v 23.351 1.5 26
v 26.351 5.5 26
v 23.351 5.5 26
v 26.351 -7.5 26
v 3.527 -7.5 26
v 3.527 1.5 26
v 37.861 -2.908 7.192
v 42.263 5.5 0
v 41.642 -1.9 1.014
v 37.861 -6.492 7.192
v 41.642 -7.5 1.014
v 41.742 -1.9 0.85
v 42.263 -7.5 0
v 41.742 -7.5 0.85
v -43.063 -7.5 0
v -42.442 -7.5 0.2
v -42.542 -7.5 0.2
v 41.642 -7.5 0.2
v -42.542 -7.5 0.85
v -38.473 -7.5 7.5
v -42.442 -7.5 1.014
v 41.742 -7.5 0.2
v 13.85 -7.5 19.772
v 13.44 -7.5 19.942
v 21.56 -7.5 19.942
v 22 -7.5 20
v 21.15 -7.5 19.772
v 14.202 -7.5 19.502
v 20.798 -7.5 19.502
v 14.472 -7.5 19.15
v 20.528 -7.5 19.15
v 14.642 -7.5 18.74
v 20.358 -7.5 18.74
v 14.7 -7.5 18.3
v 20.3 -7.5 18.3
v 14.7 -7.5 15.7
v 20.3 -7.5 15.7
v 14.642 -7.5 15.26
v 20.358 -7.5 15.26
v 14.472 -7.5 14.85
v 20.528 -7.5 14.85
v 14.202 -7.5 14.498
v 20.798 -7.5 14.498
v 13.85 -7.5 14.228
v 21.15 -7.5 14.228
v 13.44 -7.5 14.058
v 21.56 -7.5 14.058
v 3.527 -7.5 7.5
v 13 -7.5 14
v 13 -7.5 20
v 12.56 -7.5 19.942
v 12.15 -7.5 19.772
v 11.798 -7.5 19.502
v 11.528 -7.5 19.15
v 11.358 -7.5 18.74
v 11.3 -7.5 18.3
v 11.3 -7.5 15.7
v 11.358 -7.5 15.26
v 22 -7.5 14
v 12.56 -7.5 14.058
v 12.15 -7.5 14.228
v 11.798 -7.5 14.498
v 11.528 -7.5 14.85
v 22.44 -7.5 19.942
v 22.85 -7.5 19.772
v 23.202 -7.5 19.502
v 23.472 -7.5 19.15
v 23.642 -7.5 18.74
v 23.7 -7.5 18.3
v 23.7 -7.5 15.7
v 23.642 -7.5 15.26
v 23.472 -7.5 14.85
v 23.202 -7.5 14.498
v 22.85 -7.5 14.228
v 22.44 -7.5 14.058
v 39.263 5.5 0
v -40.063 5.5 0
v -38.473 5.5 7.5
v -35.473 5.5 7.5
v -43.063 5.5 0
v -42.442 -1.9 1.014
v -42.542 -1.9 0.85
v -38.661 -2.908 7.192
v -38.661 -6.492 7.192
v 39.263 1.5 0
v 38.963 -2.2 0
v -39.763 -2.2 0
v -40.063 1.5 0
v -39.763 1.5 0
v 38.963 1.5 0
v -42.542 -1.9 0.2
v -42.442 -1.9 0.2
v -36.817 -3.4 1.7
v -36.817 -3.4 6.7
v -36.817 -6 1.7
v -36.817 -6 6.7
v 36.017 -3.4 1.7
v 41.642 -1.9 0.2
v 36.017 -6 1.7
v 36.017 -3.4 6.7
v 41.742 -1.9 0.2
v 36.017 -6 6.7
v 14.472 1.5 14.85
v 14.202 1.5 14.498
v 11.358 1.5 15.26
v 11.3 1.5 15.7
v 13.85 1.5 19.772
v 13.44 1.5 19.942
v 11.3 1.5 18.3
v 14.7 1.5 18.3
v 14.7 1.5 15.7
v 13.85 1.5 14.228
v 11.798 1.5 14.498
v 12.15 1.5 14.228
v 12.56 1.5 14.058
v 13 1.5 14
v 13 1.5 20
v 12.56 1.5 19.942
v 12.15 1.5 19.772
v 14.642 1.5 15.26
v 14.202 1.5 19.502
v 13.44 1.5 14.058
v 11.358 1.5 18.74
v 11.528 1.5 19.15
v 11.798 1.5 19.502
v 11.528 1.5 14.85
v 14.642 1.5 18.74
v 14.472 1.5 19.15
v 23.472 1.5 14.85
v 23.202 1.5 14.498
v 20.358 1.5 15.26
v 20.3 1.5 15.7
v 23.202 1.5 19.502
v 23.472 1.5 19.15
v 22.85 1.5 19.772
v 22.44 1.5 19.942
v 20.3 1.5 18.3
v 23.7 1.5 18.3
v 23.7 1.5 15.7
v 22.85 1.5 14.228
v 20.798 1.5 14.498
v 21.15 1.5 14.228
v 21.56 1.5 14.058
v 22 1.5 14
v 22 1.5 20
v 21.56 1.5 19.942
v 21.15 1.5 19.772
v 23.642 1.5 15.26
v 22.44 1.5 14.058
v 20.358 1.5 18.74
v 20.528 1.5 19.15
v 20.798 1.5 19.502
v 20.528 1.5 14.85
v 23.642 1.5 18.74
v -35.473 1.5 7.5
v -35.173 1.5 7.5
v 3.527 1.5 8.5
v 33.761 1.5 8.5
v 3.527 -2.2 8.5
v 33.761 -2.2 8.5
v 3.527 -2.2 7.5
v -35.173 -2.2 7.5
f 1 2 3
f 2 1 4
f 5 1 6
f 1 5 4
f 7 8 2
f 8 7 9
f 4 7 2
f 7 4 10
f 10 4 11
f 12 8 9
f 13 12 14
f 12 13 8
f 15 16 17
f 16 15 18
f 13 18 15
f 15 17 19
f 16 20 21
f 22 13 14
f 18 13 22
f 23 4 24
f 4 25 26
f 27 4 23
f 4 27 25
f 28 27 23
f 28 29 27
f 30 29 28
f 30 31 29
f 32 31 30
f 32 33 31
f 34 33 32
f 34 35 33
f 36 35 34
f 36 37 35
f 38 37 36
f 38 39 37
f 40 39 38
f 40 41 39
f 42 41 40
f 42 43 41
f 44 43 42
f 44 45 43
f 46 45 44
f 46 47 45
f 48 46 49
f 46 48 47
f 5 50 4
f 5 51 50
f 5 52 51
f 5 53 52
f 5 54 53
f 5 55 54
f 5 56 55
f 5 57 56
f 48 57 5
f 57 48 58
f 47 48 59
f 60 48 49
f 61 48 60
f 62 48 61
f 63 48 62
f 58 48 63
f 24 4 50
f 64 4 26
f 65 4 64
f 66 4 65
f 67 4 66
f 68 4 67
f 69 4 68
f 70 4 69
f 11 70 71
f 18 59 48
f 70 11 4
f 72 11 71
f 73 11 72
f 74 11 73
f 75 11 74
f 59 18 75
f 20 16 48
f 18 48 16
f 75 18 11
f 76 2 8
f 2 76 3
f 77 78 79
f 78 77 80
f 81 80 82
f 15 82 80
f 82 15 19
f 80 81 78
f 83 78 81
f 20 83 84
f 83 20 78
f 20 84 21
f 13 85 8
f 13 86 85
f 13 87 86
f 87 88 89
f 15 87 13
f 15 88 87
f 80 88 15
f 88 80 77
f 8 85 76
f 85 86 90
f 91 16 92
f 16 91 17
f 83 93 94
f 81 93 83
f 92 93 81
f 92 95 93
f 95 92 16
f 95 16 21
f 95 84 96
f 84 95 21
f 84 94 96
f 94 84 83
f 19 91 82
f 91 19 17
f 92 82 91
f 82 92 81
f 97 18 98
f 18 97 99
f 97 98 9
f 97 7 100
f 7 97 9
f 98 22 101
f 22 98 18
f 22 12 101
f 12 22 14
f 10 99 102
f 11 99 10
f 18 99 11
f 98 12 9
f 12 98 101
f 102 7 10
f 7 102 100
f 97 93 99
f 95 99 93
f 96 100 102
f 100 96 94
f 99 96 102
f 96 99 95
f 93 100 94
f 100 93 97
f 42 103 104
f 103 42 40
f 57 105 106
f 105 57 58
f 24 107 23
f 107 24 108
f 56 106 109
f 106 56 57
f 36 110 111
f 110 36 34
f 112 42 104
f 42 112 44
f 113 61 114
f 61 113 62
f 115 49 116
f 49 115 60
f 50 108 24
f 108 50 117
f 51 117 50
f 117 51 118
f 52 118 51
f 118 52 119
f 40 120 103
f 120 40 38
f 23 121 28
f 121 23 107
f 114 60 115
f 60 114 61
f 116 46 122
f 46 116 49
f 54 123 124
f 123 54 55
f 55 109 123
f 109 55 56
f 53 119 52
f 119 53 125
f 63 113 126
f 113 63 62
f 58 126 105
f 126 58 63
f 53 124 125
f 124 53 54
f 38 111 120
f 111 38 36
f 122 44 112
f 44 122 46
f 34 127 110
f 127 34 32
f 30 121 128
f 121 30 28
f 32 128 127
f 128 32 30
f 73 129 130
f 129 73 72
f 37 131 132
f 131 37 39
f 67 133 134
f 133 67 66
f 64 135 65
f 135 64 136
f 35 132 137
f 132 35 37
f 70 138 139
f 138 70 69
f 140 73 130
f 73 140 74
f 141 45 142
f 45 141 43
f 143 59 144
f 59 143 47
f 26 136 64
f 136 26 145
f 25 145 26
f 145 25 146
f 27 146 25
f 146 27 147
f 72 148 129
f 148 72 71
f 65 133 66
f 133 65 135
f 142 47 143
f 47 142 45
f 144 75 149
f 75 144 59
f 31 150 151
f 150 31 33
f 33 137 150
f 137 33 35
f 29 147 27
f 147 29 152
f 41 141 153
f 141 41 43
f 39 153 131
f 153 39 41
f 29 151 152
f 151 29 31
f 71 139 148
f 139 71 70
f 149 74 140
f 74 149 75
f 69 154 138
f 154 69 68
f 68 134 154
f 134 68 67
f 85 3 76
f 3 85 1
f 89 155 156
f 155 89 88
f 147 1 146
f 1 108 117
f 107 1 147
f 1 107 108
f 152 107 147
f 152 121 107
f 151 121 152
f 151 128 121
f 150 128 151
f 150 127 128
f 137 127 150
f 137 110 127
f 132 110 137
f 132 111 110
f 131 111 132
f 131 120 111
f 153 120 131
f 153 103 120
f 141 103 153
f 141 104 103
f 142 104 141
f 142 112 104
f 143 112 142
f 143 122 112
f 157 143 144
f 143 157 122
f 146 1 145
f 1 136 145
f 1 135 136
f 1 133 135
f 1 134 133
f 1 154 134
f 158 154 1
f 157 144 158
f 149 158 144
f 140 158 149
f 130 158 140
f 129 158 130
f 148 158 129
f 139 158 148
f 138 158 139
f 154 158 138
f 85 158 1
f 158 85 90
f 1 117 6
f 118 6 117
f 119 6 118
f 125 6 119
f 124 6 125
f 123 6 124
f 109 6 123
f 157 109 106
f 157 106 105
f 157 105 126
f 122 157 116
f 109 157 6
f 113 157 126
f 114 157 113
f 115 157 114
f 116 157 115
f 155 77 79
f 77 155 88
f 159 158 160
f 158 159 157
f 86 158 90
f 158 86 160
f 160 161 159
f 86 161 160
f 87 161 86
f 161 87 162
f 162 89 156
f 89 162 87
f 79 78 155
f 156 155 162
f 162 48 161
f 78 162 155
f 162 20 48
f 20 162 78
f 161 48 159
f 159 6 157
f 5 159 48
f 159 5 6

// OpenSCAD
/*
Braccio gripper saddle - fit piece
==================================
The saddle the gripper-top camera holders stand on, by itself: pad, jaws,
servo slot, tie tunnel and screw slots, with no camera on it. It is a short
print for trying the fit on the gripper block before printing a holder.

Measure the gripper, set the values marked MEASURE in
braccio_gripper_camera_lib.scad, export this, and check that:

  - the jaws sit down both sloping edges of the block and the pad cannot twist;
  - the gripper servo, its horn and its lead are clear in the slot;
  - the claws open and close under the front of the pad without touching it;
  - a cable tie through the tunnel goes round the block without crossing the
    servo or the finger linkage.

    openscad -o braccio_gripper_saddle_fit_test.stl braccio_gripper_saddle_fit_test.scad

It prints standing on its front end, the end nearest the fingers.
*/

include <braccio_gripper_camera_lib.scad>

pose = "print";             // [print, gripper]
front_z = 30.0;             // about where the holders' pads end, in the wrist roll frame

// Unused by this part, but the shared file expects each part to define them.
// These put its idea of the pad's front end at front_z.
camera_height = 0;
face_z = front_z;
bed_w = 0;

module saddle_fit_test() {
    difference() {
        intersection() {
            saddle_body();
            translate([-200, -200, front_z]) mirror([0, 0, 1]) cube(400);
        }
        saddle_cuts();
    }
}

echo(str("gripper_camera {\"holder\": \"saddle_fit_test\"",
    ", \"ties\": ", ties(),
    ", \"tie_tunnel\": ", [tie_tunnel_width, tie_tunnel_thick],
    ", \"front_z\": ", front_z, "}"));

if (pose == "gripper") saddle_fit_test();
else translate([0, 0, front_z]) rotate([180, 0, 0]) saddle_fit_test();
